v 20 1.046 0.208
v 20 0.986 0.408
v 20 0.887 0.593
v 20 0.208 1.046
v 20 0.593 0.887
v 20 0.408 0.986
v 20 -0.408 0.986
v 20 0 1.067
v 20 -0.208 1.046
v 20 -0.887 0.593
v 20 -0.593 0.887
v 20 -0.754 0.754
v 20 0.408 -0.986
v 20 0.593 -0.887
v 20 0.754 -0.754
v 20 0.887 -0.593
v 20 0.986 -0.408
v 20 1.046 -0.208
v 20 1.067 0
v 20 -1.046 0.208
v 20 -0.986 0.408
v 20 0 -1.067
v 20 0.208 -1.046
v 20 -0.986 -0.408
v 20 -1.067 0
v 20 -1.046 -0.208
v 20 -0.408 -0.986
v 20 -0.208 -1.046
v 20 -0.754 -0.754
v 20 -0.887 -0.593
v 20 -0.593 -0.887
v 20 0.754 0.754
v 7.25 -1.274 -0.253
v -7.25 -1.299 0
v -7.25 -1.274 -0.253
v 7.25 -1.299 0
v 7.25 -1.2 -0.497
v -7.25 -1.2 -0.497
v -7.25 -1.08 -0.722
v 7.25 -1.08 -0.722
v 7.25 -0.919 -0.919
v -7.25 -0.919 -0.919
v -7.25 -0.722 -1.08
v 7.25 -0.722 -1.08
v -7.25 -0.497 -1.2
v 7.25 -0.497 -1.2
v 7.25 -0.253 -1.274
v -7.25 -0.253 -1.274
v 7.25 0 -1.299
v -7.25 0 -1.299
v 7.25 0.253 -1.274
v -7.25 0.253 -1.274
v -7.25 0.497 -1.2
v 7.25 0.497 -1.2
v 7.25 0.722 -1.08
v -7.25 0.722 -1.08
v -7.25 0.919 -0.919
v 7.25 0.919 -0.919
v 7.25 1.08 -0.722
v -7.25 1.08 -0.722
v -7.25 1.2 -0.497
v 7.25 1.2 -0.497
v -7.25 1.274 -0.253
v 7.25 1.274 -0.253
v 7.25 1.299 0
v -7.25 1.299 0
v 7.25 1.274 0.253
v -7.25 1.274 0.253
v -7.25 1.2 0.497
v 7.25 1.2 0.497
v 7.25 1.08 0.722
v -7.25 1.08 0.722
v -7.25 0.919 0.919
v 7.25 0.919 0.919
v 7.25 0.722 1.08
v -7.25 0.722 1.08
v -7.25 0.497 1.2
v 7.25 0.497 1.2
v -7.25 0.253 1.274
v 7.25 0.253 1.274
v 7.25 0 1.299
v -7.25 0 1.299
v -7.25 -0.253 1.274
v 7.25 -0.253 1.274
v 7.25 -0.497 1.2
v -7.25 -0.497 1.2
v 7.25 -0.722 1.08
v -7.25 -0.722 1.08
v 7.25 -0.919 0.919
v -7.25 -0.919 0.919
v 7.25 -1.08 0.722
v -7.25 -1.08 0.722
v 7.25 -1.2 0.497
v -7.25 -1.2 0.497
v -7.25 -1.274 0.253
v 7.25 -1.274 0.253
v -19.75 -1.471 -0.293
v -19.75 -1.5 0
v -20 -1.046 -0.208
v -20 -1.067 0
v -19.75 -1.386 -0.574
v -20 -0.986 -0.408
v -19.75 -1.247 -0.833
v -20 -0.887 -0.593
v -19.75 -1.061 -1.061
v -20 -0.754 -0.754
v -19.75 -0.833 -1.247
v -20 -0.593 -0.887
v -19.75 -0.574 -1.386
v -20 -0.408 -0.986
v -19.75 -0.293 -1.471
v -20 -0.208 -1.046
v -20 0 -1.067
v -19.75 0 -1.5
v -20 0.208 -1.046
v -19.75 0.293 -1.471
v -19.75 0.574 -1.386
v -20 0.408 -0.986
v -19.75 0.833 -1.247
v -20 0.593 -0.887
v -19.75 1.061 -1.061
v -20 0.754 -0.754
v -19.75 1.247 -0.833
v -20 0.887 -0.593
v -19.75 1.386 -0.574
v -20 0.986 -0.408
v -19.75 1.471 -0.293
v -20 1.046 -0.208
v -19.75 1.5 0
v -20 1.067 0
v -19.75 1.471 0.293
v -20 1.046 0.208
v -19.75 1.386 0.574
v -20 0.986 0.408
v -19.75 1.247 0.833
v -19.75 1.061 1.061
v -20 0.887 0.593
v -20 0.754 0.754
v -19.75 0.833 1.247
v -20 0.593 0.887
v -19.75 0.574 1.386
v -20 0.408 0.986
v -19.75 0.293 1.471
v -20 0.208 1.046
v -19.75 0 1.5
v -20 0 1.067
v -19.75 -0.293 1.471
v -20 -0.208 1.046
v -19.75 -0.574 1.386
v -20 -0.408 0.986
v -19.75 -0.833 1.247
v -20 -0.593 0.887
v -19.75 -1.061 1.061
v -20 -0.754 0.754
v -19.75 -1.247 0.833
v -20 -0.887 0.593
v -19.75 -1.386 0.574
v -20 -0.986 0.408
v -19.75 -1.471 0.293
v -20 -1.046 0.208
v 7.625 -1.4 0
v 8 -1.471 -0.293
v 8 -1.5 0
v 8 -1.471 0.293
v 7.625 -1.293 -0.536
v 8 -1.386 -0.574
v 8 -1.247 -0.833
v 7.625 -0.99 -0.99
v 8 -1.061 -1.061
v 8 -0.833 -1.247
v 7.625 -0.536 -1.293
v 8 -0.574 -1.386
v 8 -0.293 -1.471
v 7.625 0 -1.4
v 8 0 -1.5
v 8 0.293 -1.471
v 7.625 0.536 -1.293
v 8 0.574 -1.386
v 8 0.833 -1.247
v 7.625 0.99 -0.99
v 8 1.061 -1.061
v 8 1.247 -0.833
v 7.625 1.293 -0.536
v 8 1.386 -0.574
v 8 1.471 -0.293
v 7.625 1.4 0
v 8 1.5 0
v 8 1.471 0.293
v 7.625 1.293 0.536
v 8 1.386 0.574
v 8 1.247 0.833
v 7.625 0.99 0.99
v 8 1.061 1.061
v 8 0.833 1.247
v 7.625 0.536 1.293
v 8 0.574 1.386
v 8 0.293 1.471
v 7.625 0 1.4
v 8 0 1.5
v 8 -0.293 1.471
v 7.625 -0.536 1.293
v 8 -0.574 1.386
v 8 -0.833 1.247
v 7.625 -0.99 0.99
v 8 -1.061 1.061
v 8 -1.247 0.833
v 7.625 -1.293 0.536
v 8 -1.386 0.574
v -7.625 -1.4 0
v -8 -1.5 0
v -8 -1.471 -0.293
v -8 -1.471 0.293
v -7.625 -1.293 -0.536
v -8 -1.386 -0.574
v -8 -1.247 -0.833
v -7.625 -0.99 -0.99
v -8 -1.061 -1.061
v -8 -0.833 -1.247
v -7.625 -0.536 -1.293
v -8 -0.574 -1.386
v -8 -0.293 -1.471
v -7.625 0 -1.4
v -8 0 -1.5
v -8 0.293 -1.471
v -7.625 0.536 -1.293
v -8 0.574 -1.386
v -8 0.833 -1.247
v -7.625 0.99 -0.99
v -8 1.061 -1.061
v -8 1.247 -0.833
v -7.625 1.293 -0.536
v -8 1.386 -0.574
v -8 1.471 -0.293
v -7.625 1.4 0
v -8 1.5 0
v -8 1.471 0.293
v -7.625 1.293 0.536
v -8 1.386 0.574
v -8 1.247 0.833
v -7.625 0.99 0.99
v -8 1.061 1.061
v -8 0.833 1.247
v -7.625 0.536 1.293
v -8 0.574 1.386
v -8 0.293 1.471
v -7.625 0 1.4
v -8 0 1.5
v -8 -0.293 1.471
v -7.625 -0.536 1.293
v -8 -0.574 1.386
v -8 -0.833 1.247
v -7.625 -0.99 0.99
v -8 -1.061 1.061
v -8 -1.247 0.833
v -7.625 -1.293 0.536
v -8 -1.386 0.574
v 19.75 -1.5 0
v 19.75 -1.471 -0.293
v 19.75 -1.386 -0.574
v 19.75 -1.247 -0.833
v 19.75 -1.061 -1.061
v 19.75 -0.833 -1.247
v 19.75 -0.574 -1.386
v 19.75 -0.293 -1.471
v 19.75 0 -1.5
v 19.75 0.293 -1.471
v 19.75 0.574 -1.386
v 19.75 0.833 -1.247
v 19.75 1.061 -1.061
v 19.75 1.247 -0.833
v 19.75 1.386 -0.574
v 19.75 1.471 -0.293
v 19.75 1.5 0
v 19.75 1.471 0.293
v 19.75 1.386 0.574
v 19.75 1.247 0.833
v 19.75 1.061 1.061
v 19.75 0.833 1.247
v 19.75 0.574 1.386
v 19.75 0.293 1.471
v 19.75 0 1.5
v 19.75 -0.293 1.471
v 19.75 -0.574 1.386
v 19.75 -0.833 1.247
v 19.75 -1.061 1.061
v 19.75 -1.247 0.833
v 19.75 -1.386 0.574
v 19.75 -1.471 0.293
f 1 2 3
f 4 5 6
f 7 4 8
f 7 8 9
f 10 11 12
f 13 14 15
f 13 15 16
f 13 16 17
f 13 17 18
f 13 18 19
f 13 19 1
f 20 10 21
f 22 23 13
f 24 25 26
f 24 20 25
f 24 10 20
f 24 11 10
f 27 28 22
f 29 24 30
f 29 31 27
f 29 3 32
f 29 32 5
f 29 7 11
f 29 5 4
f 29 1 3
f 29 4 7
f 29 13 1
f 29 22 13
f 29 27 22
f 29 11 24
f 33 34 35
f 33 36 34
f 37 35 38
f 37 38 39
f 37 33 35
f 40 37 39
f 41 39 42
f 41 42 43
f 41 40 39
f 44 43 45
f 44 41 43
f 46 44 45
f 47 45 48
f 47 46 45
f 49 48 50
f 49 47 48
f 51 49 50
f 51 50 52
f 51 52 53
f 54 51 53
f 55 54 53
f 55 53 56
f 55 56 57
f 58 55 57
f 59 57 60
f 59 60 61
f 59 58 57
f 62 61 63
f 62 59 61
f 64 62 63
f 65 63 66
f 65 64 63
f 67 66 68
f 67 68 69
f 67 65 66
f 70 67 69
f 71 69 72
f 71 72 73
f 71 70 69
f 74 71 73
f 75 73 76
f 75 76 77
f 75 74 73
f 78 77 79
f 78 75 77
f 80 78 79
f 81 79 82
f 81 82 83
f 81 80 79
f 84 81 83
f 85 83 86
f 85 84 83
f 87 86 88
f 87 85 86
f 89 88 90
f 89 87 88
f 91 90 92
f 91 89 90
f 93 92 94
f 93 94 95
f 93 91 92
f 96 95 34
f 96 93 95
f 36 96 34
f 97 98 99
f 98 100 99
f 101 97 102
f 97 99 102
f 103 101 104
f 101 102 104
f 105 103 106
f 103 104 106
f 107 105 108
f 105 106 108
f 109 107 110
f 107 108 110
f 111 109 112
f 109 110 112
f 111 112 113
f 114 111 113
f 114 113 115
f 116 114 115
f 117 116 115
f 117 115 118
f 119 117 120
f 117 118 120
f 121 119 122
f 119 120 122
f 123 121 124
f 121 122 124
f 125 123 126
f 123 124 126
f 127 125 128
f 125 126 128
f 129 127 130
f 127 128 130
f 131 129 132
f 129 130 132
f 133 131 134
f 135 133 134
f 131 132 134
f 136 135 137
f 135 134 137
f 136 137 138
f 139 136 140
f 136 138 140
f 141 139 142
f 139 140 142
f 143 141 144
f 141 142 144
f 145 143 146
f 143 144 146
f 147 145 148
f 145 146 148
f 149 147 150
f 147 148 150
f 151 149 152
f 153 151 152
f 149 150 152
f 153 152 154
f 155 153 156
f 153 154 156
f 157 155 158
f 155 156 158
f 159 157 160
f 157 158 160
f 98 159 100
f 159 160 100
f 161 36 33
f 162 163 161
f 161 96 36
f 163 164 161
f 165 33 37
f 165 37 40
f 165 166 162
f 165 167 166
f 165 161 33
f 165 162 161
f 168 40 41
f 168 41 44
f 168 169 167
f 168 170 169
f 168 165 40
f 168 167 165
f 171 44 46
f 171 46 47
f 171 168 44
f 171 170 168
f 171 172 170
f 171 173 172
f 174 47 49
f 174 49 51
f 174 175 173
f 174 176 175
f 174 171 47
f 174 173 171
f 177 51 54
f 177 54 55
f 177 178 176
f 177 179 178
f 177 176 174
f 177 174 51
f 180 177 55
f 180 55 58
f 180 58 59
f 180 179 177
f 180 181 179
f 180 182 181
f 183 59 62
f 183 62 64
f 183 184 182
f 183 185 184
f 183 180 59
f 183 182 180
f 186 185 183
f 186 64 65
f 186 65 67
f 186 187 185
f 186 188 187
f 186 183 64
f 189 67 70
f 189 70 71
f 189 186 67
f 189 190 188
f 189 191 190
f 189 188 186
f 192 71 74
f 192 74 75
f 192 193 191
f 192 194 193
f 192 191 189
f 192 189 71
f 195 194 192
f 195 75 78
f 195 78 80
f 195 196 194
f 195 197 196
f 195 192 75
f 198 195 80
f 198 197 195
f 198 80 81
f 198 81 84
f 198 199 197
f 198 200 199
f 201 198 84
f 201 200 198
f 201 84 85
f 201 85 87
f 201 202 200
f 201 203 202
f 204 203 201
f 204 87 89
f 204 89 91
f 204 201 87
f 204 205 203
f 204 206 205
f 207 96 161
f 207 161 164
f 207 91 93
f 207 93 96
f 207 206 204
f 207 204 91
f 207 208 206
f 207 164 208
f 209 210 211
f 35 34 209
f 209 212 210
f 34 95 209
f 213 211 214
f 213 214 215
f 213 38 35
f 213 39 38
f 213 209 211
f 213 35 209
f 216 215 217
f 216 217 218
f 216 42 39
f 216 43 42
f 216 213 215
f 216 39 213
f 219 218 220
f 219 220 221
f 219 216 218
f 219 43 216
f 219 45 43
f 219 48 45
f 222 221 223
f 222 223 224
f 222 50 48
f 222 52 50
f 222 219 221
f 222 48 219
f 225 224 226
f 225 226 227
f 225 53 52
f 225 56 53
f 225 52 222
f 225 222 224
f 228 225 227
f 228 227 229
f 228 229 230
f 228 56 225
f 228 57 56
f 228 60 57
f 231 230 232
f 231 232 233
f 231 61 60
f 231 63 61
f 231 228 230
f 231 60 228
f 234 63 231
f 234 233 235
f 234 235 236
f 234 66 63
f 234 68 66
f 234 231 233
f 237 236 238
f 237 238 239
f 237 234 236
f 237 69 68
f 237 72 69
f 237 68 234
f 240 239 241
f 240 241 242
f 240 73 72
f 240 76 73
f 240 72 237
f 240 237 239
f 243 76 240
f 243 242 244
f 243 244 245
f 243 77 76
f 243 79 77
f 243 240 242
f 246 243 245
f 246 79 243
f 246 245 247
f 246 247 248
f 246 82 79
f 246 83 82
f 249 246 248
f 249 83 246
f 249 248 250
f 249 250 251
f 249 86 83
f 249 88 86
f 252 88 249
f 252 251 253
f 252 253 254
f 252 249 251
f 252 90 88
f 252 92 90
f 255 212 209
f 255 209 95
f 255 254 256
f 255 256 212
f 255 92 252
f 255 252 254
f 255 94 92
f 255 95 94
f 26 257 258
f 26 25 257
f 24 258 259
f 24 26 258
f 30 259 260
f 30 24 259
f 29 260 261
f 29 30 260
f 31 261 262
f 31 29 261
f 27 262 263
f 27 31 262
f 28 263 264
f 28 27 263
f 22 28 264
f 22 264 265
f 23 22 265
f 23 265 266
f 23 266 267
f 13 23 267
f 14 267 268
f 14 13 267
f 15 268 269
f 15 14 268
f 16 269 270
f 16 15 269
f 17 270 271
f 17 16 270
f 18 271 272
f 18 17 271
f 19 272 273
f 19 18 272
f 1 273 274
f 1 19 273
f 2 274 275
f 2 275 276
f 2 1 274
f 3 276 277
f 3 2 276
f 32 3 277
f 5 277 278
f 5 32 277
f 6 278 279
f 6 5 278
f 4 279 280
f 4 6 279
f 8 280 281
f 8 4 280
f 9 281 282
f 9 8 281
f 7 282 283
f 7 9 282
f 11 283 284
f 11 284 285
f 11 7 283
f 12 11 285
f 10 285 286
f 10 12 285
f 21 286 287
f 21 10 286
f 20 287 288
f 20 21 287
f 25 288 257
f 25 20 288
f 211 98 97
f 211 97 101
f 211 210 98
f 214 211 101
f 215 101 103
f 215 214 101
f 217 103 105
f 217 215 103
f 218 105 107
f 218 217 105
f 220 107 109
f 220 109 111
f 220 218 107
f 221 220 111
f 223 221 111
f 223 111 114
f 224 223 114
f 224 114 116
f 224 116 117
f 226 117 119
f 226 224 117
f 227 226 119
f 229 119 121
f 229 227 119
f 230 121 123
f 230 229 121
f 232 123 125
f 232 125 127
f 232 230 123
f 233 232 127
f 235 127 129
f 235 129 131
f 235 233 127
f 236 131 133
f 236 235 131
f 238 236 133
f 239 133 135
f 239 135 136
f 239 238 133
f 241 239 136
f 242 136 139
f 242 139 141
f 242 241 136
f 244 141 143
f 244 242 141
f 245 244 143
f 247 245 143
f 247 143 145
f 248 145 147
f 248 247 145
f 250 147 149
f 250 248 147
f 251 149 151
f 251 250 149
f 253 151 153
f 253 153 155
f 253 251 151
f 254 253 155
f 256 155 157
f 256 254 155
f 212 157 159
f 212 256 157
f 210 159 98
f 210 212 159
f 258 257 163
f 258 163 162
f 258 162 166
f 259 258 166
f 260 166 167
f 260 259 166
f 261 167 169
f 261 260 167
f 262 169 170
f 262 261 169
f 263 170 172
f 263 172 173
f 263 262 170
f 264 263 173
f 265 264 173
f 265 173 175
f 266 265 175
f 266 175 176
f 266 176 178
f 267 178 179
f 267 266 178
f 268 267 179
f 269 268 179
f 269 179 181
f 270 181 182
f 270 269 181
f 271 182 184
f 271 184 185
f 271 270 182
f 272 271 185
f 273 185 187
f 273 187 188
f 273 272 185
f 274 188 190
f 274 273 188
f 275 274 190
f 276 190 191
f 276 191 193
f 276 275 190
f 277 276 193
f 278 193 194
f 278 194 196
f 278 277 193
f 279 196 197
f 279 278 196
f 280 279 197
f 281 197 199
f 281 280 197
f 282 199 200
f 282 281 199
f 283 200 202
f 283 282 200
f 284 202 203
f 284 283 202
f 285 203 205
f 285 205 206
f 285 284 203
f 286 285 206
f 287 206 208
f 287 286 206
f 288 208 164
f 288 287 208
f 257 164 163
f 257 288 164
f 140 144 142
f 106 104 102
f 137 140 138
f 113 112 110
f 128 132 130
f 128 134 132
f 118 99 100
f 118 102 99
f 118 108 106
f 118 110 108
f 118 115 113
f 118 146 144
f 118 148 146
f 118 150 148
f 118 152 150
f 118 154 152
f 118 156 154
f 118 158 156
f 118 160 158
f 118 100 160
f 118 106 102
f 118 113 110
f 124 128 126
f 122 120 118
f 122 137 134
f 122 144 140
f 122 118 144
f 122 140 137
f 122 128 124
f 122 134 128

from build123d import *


with BuildPart() as part:
    # 草图1 → Revolve 558 (revolve)
    with BuildSketch(Plane.XY, mode=Mode.PRIVATE) as revolve_558_sk:
        Polygon((-20, 1.5), (-8, 1.5), (-7.25, 1.299), (7.25, 1.299), (8, 1.5), (20, 1.5), (20, 0), (-20, 0), align=None)
    revolve(revolve_558_sk.sketch.rotate(Axis((-20, 0, 0), (1, 0, 0)), 180), axis=Axis((-20, 0, 0), (1, 0, 0)))

    # 草图2 → Cut-Revolve 802 (revolve, cut)
    with BuildSketch(Plane.XY, mode=Mode.PRIVATE) as cut_revolve_802_sk:
        Polygon((-20.249992667, 1.5), (-19.750007333, 1.5), (-20, 1.067), align=None)
    cut_revolve_802 = revolve(cut_revolve_802_sk.sketch.rotate(Axis((-26.952426469, 0, 0), (1, 0, 0)), 180), axis=Axis((-26.952426469, 0, 0), (1, 0, 0)), mode=Mode.SUBTRACT)

    # 镜向1: Cut-Revolve 802 across plane
    add(cut_revolve_802.mirror(Plane(origin=(0, 0, 0), x_dir=(0, 0, 1), z_dir=(1, 0, 0))), mode=Mode.SUBTRACT)


solid = part.part
